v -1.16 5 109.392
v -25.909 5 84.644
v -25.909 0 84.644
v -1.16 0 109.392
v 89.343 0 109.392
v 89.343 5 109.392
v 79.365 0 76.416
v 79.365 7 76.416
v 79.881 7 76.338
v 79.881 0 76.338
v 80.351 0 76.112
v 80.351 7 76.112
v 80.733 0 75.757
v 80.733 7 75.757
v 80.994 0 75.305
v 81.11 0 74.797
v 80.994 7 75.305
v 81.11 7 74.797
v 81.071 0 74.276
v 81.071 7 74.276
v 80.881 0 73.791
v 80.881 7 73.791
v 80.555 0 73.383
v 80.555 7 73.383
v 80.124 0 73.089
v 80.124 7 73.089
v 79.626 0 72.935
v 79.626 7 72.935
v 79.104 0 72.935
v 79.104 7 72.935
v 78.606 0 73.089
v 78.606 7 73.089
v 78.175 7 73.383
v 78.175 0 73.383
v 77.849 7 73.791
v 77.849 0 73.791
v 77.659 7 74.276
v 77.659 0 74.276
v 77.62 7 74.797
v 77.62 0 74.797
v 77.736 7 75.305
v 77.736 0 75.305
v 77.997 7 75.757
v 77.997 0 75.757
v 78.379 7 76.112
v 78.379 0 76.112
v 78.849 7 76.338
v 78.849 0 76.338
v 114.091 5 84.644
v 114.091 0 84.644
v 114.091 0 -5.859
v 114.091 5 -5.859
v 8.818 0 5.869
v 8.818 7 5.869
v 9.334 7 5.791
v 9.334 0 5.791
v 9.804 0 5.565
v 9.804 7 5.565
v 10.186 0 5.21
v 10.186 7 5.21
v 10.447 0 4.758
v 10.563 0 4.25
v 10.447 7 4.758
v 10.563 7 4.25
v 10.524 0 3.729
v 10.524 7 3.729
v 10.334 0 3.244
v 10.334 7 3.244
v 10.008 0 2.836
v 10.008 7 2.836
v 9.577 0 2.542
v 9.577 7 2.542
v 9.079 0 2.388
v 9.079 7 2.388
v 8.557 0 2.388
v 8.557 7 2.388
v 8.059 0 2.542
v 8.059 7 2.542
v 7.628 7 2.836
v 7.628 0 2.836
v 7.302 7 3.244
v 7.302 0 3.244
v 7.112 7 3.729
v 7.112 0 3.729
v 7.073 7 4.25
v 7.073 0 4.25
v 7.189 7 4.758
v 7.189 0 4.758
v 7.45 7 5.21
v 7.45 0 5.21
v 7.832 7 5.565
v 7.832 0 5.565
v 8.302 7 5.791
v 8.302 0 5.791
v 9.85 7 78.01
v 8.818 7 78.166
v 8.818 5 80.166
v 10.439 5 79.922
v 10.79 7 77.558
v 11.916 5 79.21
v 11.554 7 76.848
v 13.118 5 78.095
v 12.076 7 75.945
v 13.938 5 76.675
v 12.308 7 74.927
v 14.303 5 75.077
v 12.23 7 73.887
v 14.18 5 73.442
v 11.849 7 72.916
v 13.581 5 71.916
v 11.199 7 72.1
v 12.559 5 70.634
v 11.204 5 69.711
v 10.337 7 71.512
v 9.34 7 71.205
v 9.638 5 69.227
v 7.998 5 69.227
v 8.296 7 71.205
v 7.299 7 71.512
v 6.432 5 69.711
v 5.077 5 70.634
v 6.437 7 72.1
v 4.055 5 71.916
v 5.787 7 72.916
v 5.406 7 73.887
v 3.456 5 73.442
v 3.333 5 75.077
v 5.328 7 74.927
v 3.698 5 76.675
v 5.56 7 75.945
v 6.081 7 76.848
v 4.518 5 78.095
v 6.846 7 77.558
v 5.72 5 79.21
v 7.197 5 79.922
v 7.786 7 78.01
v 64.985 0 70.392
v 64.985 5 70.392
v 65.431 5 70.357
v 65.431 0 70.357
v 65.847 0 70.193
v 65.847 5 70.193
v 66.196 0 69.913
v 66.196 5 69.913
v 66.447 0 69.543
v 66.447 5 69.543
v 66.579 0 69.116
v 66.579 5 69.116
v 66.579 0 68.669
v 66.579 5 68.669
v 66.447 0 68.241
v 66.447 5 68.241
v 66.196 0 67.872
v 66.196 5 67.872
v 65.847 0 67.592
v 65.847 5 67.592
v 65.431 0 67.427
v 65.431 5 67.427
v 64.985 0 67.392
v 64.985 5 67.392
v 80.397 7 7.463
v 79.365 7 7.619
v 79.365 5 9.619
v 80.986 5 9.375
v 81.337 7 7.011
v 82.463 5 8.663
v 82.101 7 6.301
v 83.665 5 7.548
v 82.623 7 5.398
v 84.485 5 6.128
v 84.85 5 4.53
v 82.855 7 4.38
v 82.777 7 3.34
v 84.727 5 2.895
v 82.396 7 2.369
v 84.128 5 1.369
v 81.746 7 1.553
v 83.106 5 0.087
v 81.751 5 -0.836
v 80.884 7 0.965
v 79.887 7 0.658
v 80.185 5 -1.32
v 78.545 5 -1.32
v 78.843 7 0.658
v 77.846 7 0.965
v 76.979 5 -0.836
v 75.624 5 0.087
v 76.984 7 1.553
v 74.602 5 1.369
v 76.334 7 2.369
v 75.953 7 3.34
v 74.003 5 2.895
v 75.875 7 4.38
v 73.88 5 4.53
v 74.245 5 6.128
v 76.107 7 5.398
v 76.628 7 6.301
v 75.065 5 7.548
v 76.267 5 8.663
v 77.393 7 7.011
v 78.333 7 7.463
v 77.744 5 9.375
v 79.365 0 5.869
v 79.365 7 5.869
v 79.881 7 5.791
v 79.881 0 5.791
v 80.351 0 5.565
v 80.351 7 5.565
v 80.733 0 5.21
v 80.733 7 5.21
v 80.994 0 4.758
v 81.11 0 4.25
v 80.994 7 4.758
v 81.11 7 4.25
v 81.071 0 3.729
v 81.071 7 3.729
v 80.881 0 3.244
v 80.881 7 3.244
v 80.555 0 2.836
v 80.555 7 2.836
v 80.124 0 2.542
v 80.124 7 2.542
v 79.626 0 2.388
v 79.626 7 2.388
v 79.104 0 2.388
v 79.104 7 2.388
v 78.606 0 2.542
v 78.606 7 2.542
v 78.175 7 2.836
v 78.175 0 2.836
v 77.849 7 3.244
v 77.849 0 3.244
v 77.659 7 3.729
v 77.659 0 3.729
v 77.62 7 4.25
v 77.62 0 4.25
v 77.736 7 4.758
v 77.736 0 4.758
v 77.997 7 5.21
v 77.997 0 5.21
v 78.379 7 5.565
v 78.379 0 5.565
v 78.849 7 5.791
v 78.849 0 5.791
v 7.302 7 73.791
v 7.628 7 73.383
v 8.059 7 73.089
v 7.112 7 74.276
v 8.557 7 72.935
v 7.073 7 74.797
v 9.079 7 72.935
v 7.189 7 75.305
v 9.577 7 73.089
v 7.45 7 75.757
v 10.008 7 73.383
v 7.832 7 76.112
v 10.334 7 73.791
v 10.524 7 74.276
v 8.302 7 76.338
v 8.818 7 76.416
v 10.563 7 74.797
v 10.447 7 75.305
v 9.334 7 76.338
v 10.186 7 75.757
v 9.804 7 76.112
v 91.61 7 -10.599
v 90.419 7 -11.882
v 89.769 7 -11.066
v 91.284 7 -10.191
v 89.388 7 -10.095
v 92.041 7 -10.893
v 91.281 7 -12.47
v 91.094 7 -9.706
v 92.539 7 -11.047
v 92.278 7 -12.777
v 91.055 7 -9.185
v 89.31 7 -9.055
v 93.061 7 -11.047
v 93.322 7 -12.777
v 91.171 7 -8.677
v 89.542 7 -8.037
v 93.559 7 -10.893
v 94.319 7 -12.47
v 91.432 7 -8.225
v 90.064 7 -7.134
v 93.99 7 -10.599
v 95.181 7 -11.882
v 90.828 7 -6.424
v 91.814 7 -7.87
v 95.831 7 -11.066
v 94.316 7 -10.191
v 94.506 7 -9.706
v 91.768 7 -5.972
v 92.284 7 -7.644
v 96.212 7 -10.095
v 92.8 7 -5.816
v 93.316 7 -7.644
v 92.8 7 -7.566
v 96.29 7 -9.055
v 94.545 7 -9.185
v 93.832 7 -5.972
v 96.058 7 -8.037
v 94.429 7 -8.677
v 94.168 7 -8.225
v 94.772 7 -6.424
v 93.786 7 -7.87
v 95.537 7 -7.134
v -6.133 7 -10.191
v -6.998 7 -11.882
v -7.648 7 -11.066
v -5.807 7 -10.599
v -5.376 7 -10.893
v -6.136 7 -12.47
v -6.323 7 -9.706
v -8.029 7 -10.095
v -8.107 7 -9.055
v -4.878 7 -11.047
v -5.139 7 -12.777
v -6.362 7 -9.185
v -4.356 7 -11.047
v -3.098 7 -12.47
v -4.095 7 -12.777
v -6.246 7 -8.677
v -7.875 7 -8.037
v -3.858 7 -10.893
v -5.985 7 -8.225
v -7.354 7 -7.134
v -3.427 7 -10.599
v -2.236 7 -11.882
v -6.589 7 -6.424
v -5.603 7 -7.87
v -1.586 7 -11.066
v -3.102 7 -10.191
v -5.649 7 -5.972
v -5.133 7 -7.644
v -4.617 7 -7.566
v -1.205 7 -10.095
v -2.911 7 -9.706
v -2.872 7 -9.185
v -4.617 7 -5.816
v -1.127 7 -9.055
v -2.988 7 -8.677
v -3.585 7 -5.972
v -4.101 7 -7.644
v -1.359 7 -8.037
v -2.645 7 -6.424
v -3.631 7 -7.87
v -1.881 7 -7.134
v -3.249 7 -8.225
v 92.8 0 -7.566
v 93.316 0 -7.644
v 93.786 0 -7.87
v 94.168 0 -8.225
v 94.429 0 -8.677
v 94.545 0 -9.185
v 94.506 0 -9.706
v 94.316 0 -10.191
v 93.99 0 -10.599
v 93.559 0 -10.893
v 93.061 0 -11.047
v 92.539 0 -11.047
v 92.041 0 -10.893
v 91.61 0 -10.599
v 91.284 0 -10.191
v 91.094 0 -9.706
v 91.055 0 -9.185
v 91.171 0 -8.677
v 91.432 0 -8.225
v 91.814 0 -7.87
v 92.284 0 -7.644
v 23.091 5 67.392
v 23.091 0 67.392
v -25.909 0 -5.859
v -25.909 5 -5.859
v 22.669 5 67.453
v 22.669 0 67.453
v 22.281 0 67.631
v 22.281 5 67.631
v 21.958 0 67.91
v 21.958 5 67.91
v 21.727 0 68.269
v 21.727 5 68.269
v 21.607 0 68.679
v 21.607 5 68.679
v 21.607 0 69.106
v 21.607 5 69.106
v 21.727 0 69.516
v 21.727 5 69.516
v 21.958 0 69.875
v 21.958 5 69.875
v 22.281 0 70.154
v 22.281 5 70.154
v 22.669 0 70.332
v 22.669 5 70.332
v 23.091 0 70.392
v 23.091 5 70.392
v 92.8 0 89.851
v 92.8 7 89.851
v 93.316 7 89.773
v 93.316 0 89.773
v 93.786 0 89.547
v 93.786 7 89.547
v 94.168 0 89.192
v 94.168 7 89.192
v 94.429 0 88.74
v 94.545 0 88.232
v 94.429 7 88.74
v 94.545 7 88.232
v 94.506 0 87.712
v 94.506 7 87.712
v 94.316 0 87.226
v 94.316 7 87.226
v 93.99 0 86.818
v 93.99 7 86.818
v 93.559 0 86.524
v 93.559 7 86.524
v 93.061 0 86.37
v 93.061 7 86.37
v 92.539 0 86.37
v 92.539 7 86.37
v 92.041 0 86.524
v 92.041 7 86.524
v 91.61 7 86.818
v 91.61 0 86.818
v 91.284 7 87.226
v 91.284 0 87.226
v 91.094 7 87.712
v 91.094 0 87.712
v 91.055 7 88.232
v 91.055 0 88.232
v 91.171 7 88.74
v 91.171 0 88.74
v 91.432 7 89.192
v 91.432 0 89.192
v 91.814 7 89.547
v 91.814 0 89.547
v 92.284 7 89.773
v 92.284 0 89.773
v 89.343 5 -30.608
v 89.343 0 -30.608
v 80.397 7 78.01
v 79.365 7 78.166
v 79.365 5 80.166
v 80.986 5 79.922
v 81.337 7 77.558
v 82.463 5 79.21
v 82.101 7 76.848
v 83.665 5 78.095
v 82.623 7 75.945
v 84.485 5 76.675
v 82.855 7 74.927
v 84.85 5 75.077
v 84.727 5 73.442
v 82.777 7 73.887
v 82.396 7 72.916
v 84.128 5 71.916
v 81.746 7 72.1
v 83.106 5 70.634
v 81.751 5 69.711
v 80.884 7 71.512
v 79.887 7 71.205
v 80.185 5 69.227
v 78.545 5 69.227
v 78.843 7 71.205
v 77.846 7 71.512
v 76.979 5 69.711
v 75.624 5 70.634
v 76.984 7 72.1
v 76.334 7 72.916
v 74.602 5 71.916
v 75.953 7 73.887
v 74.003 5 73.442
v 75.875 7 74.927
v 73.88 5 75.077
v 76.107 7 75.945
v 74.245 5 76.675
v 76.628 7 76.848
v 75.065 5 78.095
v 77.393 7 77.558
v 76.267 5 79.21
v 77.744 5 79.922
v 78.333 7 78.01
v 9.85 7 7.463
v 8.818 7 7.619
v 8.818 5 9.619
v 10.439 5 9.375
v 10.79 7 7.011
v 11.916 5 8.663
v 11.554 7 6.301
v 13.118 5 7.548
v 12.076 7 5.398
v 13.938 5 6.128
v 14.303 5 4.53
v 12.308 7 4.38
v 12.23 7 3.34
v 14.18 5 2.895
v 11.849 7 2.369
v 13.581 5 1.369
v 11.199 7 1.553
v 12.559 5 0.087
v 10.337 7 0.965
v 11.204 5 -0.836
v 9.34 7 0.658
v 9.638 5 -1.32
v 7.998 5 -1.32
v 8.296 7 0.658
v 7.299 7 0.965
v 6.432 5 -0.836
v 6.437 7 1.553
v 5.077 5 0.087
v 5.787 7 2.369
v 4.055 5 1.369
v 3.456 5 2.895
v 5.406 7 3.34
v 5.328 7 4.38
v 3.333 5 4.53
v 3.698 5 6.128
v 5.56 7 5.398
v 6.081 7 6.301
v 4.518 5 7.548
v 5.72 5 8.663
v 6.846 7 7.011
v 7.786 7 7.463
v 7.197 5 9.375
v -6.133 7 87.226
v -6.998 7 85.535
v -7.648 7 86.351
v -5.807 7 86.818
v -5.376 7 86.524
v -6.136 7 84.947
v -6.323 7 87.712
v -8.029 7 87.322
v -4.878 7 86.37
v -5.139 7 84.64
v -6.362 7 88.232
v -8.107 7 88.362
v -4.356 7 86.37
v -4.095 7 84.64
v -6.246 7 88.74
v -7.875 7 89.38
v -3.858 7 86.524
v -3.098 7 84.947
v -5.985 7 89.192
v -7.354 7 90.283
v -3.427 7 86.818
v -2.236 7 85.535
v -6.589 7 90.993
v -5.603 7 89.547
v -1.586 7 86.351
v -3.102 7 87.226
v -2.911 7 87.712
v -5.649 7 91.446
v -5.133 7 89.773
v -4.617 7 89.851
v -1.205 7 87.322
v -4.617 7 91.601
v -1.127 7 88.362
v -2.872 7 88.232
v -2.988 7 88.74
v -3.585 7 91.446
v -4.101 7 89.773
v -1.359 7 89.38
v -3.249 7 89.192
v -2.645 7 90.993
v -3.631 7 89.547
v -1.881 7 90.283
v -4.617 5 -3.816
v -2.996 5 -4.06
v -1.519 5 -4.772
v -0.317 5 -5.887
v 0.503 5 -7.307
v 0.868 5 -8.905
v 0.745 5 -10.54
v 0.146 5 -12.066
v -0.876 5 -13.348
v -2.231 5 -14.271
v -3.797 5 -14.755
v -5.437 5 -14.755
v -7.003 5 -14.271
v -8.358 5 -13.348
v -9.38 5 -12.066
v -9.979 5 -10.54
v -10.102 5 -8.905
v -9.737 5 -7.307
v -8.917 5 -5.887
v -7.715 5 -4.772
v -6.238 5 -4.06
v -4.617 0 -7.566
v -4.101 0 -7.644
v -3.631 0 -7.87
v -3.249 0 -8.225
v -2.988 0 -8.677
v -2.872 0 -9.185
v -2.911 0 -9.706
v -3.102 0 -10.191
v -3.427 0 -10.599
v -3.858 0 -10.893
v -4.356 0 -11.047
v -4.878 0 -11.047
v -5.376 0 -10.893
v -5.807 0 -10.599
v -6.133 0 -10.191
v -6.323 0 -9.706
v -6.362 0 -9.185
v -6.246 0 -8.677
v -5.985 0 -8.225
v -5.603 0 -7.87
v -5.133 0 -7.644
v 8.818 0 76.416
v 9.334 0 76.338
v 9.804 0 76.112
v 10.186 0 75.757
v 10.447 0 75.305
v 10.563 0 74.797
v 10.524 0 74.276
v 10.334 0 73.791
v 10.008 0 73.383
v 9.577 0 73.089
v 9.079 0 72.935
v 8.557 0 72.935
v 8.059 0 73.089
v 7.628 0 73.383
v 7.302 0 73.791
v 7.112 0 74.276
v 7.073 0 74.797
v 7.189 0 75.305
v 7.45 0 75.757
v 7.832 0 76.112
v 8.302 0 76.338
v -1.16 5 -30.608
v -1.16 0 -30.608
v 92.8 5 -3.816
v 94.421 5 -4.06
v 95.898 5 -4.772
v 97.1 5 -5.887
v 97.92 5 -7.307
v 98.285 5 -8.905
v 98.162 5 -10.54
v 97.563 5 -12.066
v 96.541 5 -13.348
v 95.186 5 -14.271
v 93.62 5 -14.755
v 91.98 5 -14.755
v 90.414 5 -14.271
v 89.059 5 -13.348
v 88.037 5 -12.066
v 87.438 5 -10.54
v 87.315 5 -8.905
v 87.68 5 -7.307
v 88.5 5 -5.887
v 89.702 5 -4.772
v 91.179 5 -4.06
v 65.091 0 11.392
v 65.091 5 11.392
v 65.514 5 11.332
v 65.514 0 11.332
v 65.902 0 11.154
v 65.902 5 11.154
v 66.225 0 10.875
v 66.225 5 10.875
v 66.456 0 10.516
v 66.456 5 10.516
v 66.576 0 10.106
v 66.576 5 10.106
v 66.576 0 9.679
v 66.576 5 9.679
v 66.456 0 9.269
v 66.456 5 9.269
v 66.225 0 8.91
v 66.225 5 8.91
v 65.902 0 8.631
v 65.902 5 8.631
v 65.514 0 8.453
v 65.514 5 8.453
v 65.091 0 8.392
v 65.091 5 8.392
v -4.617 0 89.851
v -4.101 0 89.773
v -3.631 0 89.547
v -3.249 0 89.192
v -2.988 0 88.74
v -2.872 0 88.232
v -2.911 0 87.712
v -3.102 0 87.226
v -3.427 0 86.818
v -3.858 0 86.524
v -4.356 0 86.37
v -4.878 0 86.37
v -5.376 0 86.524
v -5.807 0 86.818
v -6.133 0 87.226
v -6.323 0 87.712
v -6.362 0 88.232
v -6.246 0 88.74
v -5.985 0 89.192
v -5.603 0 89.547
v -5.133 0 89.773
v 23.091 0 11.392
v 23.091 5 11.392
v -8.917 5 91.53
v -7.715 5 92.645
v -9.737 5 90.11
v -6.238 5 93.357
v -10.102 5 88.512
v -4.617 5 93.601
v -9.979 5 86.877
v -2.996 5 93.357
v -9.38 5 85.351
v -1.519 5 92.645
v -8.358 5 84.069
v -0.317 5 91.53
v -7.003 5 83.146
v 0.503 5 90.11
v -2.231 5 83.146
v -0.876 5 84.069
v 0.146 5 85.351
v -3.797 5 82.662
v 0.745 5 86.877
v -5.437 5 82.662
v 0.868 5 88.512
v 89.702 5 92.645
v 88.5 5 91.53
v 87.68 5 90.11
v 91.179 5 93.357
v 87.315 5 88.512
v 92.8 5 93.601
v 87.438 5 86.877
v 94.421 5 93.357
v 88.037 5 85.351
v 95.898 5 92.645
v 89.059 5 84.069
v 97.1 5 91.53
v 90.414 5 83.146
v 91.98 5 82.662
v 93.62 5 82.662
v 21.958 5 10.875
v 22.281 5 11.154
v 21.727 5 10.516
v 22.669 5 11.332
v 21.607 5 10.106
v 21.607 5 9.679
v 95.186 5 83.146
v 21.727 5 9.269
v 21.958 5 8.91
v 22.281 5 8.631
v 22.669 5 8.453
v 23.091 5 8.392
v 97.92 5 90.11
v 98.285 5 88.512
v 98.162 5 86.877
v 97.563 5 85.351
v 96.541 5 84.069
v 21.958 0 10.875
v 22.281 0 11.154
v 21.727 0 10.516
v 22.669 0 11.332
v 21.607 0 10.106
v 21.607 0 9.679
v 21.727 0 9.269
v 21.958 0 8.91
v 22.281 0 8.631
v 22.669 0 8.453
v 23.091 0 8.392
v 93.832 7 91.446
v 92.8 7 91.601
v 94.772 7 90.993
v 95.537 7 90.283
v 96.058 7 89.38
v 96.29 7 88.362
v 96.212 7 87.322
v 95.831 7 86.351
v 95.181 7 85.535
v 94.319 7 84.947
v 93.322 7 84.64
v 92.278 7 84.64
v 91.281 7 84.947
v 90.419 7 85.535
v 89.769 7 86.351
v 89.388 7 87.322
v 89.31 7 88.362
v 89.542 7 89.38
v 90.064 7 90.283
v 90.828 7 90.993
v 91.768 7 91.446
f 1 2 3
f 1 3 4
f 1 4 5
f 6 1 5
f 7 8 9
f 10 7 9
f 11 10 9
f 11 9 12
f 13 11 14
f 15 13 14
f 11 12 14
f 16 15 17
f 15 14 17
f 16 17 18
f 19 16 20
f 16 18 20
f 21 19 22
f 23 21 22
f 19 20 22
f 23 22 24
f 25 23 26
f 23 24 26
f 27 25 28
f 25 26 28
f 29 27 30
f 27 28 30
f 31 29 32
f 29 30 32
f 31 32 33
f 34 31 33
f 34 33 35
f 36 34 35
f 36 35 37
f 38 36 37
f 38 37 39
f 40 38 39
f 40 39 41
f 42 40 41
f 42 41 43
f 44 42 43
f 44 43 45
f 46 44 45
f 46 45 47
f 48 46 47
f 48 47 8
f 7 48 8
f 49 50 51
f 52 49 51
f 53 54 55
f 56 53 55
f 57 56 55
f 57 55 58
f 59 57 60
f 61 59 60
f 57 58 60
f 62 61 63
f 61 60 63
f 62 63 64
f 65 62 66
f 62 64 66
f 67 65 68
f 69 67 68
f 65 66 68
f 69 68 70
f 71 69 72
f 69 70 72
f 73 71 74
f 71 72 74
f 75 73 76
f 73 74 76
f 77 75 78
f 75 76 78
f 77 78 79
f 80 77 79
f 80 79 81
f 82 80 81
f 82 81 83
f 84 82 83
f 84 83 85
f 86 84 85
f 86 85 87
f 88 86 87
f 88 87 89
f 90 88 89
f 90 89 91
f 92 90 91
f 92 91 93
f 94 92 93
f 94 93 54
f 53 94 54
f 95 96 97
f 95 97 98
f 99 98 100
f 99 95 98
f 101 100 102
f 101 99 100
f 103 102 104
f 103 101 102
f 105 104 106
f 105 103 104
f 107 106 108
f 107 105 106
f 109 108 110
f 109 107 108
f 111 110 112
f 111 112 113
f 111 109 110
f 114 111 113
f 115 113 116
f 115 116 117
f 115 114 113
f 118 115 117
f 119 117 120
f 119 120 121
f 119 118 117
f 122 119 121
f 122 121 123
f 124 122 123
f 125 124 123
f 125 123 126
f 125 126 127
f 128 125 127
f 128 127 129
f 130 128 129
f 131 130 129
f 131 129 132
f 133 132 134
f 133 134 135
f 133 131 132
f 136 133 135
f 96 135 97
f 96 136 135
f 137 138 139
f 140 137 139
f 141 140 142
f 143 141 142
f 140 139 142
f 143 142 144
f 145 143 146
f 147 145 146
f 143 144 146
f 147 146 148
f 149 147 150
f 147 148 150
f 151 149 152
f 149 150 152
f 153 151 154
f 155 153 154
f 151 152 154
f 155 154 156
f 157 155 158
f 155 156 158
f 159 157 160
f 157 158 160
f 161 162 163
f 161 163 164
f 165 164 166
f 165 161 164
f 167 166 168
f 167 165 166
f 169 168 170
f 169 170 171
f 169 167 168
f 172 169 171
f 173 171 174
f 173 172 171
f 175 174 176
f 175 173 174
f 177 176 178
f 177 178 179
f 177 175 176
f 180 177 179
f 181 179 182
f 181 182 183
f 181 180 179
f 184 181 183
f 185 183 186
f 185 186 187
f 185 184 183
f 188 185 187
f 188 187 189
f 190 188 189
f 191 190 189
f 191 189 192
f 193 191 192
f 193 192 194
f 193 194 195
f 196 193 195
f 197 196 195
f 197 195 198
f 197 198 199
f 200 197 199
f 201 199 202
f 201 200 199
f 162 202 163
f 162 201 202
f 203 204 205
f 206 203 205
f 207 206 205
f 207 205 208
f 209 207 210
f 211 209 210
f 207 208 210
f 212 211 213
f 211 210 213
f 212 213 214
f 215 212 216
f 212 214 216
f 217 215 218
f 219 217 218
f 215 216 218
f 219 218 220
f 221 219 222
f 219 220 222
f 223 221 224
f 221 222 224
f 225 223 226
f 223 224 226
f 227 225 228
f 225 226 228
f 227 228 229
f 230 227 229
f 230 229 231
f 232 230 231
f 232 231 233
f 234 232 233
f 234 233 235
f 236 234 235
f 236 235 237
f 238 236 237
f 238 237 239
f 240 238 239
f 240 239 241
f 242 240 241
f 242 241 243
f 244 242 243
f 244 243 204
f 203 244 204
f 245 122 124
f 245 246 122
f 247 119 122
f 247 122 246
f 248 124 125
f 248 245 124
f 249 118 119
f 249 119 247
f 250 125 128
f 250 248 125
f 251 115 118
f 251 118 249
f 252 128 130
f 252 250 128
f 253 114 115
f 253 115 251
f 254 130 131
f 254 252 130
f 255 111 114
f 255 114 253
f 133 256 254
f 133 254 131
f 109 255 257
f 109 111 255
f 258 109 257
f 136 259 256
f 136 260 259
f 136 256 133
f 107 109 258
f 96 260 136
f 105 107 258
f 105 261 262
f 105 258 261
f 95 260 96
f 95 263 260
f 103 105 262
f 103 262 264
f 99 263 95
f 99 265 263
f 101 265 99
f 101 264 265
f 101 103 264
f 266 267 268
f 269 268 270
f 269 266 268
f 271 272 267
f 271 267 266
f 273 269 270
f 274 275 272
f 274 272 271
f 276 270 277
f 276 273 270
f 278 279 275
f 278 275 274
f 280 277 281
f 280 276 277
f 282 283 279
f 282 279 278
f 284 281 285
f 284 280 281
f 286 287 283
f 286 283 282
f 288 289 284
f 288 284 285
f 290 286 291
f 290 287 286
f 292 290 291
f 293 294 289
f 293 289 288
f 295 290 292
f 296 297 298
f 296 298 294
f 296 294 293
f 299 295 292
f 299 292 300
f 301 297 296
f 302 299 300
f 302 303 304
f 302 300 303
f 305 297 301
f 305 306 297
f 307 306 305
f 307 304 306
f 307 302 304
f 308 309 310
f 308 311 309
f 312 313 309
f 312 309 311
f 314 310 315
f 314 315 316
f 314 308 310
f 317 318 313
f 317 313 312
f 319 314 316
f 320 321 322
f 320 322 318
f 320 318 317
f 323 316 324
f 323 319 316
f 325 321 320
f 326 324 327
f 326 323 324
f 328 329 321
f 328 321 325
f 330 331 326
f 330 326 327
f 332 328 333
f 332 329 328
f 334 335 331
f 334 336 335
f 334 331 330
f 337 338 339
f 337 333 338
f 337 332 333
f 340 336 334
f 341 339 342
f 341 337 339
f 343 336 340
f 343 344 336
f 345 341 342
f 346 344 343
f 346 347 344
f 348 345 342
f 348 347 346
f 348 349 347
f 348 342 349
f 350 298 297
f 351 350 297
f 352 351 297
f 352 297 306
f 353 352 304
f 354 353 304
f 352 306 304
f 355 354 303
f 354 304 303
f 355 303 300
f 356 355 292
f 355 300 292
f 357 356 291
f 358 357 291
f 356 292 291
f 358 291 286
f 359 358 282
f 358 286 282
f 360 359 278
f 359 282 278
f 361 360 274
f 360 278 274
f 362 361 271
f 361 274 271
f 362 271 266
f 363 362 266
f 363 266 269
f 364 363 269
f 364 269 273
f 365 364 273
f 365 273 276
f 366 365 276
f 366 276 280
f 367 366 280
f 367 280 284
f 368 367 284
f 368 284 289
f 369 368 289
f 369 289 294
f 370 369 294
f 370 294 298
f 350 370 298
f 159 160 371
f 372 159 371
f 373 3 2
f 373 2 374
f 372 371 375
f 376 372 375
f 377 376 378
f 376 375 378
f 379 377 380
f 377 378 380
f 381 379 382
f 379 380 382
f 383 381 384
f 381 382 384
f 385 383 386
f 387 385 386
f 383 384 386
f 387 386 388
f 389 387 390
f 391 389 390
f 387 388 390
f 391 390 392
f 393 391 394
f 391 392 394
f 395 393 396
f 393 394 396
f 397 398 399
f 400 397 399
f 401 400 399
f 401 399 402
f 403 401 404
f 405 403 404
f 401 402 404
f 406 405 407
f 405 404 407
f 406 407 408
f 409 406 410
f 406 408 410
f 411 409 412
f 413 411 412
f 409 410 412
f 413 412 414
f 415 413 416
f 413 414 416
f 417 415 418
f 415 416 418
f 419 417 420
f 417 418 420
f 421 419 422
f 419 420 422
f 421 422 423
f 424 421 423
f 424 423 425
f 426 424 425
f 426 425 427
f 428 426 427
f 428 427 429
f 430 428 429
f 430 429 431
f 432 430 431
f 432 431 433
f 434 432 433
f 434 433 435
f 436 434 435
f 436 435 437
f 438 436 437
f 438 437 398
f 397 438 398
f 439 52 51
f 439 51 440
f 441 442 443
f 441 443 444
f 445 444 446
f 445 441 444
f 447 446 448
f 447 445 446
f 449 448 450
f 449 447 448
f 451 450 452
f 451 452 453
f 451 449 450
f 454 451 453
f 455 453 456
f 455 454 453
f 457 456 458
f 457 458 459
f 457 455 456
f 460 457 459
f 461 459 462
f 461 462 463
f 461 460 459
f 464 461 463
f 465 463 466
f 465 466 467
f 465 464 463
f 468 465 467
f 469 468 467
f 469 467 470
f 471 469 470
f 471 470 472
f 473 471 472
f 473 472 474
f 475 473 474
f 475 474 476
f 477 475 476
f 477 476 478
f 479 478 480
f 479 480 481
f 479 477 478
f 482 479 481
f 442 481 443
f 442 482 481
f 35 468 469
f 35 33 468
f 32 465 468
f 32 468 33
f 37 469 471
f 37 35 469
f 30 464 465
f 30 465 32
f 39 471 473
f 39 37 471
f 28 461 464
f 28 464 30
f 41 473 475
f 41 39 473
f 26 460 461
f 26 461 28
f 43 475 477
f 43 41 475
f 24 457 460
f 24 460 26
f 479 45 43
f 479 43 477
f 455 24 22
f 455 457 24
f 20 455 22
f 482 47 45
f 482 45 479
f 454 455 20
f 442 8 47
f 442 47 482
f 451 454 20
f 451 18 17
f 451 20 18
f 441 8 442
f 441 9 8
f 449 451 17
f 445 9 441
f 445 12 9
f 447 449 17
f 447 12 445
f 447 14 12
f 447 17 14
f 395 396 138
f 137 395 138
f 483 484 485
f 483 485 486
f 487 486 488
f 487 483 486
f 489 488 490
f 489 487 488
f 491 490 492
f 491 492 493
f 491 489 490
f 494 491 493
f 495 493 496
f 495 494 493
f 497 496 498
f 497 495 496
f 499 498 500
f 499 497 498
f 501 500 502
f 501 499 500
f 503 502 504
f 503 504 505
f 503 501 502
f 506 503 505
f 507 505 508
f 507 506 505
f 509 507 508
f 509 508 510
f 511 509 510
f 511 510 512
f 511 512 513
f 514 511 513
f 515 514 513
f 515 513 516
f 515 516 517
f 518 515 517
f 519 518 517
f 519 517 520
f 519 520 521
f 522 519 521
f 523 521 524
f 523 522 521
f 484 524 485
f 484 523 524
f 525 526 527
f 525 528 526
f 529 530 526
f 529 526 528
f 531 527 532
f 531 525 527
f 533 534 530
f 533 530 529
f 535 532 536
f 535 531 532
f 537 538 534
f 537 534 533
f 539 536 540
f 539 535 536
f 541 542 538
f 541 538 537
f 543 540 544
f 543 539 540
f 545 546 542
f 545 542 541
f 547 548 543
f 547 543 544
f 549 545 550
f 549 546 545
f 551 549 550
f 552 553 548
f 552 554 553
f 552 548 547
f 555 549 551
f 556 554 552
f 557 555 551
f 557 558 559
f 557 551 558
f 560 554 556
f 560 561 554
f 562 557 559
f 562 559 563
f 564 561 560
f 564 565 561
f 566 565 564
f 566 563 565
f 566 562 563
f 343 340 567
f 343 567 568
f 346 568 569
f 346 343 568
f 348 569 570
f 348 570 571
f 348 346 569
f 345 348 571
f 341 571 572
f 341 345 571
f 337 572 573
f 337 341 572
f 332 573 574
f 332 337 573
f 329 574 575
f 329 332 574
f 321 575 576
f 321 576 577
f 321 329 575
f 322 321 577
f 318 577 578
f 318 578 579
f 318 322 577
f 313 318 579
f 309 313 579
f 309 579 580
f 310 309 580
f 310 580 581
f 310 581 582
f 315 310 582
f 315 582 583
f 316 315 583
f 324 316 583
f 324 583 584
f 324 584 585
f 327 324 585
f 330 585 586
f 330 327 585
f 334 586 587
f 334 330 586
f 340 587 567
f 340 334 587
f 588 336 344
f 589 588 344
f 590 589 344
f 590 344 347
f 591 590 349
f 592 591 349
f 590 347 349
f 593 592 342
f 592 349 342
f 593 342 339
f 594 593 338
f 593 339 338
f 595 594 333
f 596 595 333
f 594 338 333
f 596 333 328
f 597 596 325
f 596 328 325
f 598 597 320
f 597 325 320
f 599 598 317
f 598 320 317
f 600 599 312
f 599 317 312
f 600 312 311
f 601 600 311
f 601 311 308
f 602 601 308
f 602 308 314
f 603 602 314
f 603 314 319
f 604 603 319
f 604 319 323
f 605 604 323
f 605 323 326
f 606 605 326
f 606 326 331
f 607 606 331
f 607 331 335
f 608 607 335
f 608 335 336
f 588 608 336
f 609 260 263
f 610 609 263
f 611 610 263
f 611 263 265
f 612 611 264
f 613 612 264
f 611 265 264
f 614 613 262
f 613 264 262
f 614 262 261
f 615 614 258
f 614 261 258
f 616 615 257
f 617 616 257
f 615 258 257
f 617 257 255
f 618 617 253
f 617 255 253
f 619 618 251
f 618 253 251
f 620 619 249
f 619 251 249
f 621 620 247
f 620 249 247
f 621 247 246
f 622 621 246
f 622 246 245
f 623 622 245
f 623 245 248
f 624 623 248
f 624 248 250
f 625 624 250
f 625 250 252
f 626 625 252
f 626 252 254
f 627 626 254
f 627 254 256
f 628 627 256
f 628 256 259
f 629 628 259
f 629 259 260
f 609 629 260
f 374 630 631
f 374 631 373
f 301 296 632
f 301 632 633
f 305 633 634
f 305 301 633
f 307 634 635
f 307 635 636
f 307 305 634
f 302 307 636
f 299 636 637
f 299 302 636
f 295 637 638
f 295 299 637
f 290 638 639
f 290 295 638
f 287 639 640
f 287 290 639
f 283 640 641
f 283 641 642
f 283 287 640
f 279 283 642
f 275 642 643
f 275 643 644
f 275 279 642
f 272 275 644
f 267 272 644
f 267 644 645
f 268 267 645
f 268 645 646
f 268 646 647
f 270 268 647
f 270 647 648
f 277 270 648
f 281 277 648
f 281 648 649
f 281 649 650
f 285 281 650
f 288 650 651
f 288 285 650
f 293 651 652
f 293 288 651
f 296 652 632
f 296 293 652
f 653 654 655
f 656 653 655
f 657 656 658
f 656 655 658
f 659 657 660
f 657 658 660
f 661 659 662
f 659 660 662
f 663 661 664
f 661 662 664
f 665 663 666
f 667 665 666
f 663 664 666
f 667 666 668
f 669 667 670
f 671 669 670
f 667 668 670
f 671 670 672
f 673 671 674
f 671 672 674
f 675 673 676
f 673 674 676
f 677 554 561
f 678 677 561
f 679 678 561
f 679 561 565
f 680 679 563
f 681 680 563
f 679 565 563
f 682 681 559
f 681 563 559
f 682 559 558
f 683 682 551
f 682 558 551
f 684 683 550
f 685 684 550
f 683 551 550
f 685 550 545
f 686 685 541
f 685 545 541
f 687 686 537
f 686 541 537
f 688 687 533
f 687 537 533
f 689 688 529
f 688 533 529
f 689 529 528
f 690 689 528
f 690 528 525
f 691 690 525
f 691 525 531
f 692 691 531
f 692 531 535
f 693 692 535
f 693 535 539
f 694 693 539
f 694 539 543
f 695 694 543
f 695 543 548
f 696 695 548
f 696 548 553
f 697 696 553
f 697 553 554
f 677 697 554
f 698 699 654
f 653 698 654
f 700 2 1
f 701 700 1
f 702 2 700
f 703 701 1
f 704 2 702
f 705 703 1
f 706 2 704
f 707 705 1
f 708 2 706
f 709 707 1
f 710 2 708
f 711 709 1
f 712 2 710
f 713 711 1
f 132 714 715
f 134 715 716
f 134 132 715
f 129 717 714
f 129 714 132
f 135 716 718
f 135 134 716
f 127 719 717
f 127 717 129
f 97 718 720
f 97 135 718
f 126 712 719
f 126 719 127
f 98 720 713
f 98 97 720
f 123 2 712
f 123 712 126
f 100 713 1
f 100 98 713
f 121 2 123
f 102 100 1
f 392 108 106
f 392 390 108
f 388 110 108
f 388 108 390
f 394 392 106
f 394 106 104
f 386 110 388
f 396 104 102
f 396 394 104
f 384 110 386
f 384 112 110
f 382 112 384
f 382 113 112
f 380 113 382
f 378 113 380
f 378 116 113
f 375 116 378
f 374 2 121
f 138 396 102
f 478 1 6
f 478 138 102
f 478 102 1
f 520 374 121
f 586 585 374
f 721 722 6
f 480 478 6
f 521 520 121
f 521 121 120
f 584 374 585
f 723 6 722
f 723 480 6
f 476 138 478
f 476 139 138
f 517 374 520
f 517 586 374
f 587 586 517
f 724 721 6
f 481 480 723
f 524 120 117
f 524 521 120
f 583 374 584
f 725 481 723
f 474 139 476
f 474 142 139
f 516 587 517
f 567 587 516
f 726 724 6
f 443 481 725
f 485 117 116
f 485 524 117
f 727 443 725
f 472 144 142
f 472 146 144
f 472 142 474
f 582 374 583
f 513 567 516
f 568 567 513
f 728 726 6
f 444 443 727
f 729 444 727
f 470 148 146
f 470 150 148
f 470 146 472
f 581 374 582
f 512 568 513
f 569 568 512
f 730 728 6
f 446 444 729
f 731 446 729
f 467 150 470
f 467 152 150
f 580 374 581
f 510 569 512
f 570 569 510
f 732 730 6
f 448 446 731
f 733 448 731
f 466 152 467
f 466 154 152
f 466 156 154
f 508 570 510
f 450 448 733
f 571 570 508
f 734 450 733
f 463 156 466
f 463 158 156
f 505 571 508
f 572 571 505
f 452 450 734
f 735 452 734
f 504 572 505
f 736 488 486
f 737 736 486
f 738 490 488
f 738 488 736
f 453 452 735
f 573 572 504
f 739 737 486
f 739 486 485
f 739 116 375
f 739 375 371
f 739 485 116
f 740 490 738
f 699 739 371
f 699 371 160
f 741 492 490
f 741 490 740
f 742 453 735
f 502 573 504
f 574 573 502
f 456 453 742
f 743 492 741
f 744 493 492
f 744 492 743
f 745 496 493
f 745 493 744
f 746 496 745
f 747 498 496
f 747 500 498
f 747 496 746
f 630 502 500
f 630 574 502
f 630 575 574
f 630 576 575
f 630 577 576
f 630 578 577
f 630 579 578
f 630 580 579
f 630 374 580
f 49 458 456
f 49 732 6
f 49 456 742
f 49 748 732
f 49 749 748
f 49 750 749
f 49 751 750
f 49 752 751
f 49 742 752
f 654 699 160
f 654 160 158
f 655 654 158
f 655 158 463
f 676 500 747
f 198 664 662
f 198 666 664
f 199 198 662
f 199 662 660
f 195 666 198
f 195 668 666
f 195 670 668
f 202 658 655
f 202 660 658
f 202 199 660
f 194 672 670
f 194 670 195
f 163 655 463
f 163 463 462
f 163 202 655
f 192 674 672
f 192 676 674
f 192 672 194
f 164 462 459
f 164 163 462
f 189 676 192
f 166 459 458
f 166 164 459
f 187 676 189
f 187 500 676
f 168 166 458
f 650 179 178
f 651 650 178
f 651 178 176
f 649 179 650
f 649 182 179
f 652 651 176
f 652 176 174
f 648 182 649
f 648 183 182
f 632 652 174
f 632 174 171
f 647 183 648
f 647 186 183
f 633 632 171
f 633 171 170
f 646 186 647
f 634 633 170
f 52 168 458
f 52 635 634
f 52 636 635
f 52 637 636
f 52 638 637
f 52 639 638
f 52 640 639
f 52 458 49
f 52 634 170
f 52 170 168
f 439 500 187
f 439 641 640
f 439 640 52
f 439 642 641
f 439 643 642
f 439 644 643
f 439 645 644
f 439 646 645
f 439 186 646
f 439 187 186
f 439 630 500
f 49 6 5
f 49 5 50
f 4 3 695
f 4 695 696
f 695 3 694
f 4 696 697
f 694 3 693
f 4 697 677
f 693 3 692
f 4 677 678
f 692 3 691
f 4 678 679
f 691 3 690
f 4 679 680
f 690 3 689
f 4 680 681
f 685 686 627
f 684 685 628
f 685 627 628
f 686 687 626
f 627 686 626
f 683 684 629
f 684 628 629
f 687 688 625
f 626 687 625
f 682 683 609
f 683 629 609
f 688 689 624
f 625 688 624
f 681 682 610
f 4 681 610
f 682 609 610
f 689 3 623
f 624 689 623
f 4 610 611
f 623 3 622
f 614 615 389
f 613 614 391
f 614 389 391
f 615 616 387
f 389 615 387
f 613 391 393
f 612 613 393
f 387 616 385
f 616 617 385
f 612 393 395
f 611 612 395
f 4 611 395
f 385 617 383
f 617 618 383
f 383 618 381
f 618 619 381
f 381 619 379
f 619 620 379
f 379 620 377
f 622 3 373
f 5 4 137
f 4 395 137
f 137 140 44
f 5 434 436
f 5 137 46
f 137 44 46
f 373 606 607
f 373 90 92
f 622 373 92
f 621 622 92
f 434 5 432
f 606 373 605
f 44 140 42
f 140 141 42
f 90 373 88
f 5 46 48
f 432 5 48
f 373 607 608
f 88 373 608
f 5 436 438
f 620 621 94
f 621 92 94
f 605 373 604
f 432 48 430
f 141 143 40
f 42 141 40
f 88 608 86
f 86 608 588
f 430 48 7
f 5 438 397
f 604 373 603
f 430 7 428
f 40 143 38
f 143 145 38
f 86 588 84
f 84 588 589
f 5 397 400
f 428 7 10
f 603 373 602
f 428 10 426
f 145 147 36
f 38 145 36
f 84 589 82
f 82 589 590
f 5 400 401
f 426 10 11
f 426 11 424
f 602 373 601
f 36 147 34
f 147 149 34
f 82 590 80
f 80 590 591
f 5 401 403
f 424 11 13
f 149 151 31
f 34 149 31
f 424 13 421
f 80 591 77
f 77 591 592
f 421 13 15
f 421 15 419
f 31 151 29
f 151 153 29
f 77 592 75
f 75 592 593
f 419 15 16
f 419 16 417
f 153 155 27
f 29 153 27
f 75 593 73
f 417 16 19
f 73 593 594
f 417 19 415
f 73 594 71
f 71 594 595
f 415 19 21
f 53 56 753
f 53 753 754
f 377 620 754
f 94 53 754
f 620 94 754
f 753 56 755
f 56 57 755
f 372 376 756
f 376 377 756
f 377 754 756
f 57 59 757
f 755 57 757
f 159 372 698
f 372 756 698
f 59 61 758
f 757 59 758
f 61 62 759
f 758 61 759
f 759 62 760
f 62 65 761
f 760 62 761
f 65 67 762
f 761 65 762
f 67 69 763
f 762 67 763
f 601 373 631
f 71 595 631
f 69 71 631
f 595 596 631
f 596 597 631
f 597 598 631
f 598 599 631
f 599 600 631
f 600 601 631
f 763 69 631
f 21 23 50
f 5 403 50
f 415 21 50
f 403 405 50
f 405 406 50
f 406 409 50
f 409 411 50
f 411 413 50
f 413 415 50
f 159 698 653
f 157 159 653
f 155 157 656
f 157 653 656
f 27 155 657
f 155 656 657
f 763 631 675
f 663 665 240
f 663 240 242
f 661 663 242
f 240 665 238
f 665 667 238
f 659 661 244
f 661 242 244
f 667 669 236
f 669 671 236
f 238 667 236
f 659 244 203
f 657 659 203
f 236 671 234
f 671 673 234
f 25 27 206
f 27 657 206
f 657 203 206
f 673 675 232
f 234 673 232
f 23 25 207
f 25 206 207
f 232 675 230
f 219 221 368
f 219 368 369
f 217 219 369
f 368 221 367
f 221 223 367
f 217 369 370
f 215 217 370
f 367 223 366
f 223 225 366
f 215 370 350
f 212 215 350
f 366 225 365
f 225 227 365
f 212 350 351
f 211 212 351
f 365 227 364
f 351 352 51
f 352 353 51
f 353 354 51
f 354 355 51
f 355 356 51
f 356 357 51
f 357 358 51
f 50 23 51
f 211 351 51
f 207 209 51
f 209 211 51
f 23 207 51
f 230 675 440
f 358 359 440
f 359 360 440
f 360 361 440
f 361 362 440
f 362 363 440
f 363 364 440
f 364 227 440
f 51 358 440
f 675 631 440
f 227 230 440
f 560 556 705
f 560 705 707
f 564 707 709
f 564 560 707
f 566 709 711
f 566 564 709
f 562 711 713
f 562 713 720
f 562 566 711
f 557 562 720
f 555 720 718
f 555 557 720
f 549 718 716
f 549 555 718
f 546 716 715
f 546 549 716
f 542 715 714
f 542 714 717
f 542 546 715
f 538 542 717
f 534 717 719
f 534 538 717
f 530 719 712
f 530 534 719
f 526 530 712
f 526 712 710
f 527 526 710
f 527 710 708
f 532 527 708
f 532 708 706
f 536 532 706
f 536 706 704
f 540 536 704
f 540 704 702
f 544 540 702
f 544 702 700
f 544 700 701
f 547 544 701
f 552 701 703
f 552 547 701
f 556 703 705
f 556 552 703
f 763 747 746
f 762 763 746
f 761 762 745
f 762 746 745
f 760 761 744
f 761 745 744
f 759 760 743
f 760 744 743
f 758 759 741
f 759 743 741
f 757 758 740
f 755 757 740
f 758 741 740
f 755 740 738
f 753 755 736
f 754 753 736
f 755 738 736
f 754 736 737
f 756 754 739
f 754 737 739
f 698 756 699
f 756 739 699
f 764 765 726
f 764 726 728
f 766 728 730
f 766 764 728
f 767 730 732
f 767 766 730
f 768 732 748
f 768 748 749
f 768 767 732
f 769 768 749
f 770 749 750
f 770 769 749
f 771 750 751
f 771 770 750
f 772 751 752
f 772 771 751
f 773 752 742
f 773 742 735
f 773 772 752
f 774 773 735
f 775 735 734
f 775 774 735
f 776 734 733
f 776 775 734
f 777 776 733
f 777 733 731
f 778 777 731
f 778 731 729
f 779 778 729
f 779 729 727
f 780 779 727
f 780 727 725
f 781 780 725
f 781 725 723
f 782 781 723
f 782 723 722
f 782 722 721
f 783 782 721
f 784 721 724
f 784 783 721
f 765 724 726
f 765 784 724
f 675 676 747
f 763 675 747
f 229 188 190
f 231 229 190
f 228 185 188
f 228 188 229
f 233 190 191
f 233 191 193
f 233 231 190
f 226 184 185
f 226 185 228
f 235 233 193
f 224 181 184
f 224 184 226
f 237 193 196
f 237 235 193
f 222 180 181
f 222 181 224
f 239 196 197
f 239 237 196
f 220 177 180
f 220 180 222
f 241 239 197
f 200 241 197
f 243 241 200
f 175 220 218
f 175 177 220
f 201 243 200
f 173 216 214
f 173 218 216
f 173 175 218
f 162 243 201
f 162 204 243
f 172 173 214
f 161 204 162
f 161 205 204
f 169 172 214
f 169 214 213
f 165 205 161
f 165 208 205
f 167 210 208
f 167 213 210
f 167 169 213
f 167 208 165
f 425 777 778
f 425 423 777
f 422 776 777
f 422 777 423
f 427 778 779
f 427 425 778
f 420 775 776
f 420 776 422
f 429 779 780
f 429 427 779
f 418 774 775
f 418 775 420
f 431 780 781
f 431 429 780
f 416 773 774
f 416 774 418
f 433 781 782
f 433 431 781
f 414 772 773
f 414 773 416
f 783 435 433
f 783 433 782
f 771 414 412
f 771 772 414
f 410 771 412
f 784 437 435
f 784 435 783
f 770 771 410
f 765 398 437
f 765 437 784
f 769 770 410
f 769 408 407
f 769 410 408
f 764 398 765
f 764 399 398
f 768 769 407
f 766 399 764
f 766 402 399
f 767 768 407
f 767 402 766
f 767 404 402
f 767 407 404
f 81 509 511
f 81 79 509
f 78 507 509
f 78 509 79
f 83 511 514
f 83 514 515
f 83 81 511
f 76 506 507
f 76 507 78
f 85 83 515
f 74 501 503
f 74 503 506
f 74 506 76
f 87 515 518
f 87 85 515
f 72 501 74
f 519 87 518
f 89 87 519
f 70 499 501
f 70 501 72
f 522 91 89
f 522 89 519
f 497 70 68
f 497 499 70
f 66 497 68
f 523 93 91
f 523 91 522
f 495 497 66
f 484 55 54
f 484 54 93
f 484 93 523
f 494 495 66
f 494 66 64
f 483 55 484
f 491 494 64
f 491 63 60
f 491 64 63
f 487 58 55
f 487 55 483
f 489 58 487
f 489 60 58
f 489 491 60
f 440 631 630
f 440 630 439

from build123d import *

# Parameters (mm, degrees)
SCHIZZO1_W                   = 140
SCHIZZO1_H                   = 140
ESTRUSIONE_ESTRUSIONE1_DEPTH = 5
TAGLIO_ESTRUSIONE1_DEPTH     = 159.140950013
TAGLIO_ESTRUSIONE2_DEPTH     = 159.140950013
SCHIZZO4_R                   = 5.5
ESTRUSIONE_ESTRUSIONE2_DEPTH = 2
SMUSSO1_SIZE                 = 2
SCHIZZO5_R                   = 1.75
TAGLIO_ESTRUSIONE3_DEPTH     = 159.21681349


with BuildPart() as part:
    # Schizzo1 → Estrusione-Estrusione1 (new body)
    with BuildSketch(Plane(origin=(0, 0, 0), x_dir=(1, 0, 0), z_dir=(0, 1, 0))):
        with Locations((44.091480444, -39.392386211)):
            Rectangle(SCHIZZO1_W, SCHIZZO1_H)
    extrude(amount=ESTRUSIONE_ESTRUSIONE1_DEPTH)

    # Schizzo2 → Taglio-Estrusione1 (cut, through all)
    with BuildSketch(Plane(origin=(0, 5, 0), x_dir=(1, 0, 0), z_dir=(0, 1, 0))):
        Polygon((-1.159782214, 30.607613789), (-25.908519556, 5.858876448), (-25.908519556, 30.607613789), align=None)
        Polygon((114.091480444, 5.858876448), (89.342743103, 30.607613789), (114.091480444, 30.607613789), align=None)
        Polygon((89.342743103, -109.392386211), (114.091480444, -84.643648869), (114.091480444, -109.392386211), align=None)
        Polygon((-25.908519556, -84.643648869), (-1.159782214, -109.392386211), (-25.908519556, -109.392386211), align=None)
    extrude(amount=-TAGLIO_ESTRUSIONE1_DEPTH, mode=Mode.SUBTRACT)

    # Schizzo3 → Taglio-Estrusione2 (cut, through all)
    with BuildSketch(Plane(origin=(0, 5, 0), x_dir=(1, 0, 0), z_dir=(0, 1, 0))):
        with BuildLine():
            Line((64.984963173, -67.392386211), (23.091480444, -67.392386211))
            ThreePointArc((23.091480444, -67.392386211), (21.591480444, -68.892386211), (23.091480444, -70.392386211))
            Line((23.091480444, -70.392386211), (64.984963173, -70.392386211))
            ThreePointArc((64.984963173, -70.392386211), (66.595257665, -68.892386211), (64.984963173, -67.392386211))
        make_face()
        with BuildLine():
            Line((65.091480444, -8.392386211), (23.091480444, -8.392386211))
            ThreePointArc((23.091480444, -8.392386211), (21.591480444, -9.892386211), (23.091480444, -11.392386211))
            Line((23.091480444, -11.392386211), (65.091480444, -11.392386211))
            ThreePointArc((65.091480444, -11.392386211), (66.591480444, -9.892386211), (65.091480444, -8.392386211))
        make_face()
    extrude(amount=-TAGLIO_ESTRUSIONE2_DEPTH, mode=Mode.SUBTRACT)

    # Schizzo4 → Estrusione-Estrusione2 (add)
    with BuildSketch(Plane(origin=(0, 5, 0), x_dir=(1, 0, 0), z_dir=(0, 1, 0))):
        with Locations(Location((-4.617054872, -88.100921527, 0), (0, 0, 270))):
            Circle(SCHIZZO4_R)
        with Locations(Location((8.817973971, -74.665892685, 0), (0, 0, 270))):
            Circle(SCHIZZO4_R)
        with Locations(Location((-4.617054872, 9.316149105, 0), (0, 0, 270))):
            Circle(SCHIZZO4_R)
        with Locations(Location((8.817973971, -4.118879737, 0), (0, 0, 270))):
            Circle(SCHIZZO4_R)
        with Locations(Location((92.80001576, 9.316149105, 0), (0, 0, 270))):
            Circle(SCHIZZO4_R)
        with Locations(Location((79.364986918, -4.118879737, 0), (0, 0, 270))):
            Circle(SCHIZZO4_R)
        with Locations(Location((92.80001576, -88.100921527, 0), (0, 0, 270))):
            Circle(SCHIZZO4_R)
        with Locations(Location((79.364986918, -74.665892685, 0), (0, 0, 270))):
            Circle(SCHIZZO4_R)
    extrude(amount=ESTRUSIONE_ESTRUSIONE2_DEPTH)

    # Smusso1
    smusso1_edges = [part.edges().sort_by_distance(p)[0] for p in [
        (92.80001576, 7, -14.816149105),
        (79.364986918, 7, -1.381120263),
        (92.80001576, 7, 82.600921527),
        (79.364986918, 7, 69.165892685),
        (-4.617054872, 7, 82.600921527),
        (8.817973971, 7, 69.165892685),
        (-4.617054872, 7, -14.816149105),
        (8.817973971, 7, -1.381120263),
    ]]
    chamfer(smusso1_edges, length=SMUSSO1_SIZE - 0.0001)  # a hair under: the kernel refuses the full size

    # Schizzo5 → Taglio-Estrusione3 (cut, through all)
    with BuildSketch(Plane(origin=(0, 7, 0), x_dir=(1, 0, 0), z_dir=(0, 1, 0))):
        with Locations(Location((-4.617054872, -88.100921527, 0), (0, 0, 270))):
            Circle(SCHIZZO5_R)
        with Locations(Location((8.817973971, -74.665892685, 0), (0, 0, 270))):
            Circle(SCHIZZO5_R)
        with Locations(Location((-4.617054872, 9.316149105, 0), (0, 0, 270))):
            Circle(SCHIZZO5_R)
        with Locations(Location((8.817973971, -4.118879737, 0), (0, 0, 270))):
            Circle(SCHIZZO5_R)
        with Locations(Location((92.80001576, 9.316149105, 0), (0, 0, 270))):
            Circle(SCHIZZO5_R)
        with Locations(Location((79.364986918, -4.118879737, 0), (0, 0, 270))):
            Circle(SCHIZZO5_R)
        with Locations(Location((92.80001576, -88.100921527, 0), (0, 0, 270))):
            Circle(SCHIZZO5_R)
        with Locations(Location((79.364986918, -74.665892685, 0), (0, 0, 270))):
            Circle(SCHIZZO5_R)
    extrude(amount=-TAGLIO_ESTRUSIONE3_DEPTH, mode=Mode.SUBTRACT)


solid = part.part
